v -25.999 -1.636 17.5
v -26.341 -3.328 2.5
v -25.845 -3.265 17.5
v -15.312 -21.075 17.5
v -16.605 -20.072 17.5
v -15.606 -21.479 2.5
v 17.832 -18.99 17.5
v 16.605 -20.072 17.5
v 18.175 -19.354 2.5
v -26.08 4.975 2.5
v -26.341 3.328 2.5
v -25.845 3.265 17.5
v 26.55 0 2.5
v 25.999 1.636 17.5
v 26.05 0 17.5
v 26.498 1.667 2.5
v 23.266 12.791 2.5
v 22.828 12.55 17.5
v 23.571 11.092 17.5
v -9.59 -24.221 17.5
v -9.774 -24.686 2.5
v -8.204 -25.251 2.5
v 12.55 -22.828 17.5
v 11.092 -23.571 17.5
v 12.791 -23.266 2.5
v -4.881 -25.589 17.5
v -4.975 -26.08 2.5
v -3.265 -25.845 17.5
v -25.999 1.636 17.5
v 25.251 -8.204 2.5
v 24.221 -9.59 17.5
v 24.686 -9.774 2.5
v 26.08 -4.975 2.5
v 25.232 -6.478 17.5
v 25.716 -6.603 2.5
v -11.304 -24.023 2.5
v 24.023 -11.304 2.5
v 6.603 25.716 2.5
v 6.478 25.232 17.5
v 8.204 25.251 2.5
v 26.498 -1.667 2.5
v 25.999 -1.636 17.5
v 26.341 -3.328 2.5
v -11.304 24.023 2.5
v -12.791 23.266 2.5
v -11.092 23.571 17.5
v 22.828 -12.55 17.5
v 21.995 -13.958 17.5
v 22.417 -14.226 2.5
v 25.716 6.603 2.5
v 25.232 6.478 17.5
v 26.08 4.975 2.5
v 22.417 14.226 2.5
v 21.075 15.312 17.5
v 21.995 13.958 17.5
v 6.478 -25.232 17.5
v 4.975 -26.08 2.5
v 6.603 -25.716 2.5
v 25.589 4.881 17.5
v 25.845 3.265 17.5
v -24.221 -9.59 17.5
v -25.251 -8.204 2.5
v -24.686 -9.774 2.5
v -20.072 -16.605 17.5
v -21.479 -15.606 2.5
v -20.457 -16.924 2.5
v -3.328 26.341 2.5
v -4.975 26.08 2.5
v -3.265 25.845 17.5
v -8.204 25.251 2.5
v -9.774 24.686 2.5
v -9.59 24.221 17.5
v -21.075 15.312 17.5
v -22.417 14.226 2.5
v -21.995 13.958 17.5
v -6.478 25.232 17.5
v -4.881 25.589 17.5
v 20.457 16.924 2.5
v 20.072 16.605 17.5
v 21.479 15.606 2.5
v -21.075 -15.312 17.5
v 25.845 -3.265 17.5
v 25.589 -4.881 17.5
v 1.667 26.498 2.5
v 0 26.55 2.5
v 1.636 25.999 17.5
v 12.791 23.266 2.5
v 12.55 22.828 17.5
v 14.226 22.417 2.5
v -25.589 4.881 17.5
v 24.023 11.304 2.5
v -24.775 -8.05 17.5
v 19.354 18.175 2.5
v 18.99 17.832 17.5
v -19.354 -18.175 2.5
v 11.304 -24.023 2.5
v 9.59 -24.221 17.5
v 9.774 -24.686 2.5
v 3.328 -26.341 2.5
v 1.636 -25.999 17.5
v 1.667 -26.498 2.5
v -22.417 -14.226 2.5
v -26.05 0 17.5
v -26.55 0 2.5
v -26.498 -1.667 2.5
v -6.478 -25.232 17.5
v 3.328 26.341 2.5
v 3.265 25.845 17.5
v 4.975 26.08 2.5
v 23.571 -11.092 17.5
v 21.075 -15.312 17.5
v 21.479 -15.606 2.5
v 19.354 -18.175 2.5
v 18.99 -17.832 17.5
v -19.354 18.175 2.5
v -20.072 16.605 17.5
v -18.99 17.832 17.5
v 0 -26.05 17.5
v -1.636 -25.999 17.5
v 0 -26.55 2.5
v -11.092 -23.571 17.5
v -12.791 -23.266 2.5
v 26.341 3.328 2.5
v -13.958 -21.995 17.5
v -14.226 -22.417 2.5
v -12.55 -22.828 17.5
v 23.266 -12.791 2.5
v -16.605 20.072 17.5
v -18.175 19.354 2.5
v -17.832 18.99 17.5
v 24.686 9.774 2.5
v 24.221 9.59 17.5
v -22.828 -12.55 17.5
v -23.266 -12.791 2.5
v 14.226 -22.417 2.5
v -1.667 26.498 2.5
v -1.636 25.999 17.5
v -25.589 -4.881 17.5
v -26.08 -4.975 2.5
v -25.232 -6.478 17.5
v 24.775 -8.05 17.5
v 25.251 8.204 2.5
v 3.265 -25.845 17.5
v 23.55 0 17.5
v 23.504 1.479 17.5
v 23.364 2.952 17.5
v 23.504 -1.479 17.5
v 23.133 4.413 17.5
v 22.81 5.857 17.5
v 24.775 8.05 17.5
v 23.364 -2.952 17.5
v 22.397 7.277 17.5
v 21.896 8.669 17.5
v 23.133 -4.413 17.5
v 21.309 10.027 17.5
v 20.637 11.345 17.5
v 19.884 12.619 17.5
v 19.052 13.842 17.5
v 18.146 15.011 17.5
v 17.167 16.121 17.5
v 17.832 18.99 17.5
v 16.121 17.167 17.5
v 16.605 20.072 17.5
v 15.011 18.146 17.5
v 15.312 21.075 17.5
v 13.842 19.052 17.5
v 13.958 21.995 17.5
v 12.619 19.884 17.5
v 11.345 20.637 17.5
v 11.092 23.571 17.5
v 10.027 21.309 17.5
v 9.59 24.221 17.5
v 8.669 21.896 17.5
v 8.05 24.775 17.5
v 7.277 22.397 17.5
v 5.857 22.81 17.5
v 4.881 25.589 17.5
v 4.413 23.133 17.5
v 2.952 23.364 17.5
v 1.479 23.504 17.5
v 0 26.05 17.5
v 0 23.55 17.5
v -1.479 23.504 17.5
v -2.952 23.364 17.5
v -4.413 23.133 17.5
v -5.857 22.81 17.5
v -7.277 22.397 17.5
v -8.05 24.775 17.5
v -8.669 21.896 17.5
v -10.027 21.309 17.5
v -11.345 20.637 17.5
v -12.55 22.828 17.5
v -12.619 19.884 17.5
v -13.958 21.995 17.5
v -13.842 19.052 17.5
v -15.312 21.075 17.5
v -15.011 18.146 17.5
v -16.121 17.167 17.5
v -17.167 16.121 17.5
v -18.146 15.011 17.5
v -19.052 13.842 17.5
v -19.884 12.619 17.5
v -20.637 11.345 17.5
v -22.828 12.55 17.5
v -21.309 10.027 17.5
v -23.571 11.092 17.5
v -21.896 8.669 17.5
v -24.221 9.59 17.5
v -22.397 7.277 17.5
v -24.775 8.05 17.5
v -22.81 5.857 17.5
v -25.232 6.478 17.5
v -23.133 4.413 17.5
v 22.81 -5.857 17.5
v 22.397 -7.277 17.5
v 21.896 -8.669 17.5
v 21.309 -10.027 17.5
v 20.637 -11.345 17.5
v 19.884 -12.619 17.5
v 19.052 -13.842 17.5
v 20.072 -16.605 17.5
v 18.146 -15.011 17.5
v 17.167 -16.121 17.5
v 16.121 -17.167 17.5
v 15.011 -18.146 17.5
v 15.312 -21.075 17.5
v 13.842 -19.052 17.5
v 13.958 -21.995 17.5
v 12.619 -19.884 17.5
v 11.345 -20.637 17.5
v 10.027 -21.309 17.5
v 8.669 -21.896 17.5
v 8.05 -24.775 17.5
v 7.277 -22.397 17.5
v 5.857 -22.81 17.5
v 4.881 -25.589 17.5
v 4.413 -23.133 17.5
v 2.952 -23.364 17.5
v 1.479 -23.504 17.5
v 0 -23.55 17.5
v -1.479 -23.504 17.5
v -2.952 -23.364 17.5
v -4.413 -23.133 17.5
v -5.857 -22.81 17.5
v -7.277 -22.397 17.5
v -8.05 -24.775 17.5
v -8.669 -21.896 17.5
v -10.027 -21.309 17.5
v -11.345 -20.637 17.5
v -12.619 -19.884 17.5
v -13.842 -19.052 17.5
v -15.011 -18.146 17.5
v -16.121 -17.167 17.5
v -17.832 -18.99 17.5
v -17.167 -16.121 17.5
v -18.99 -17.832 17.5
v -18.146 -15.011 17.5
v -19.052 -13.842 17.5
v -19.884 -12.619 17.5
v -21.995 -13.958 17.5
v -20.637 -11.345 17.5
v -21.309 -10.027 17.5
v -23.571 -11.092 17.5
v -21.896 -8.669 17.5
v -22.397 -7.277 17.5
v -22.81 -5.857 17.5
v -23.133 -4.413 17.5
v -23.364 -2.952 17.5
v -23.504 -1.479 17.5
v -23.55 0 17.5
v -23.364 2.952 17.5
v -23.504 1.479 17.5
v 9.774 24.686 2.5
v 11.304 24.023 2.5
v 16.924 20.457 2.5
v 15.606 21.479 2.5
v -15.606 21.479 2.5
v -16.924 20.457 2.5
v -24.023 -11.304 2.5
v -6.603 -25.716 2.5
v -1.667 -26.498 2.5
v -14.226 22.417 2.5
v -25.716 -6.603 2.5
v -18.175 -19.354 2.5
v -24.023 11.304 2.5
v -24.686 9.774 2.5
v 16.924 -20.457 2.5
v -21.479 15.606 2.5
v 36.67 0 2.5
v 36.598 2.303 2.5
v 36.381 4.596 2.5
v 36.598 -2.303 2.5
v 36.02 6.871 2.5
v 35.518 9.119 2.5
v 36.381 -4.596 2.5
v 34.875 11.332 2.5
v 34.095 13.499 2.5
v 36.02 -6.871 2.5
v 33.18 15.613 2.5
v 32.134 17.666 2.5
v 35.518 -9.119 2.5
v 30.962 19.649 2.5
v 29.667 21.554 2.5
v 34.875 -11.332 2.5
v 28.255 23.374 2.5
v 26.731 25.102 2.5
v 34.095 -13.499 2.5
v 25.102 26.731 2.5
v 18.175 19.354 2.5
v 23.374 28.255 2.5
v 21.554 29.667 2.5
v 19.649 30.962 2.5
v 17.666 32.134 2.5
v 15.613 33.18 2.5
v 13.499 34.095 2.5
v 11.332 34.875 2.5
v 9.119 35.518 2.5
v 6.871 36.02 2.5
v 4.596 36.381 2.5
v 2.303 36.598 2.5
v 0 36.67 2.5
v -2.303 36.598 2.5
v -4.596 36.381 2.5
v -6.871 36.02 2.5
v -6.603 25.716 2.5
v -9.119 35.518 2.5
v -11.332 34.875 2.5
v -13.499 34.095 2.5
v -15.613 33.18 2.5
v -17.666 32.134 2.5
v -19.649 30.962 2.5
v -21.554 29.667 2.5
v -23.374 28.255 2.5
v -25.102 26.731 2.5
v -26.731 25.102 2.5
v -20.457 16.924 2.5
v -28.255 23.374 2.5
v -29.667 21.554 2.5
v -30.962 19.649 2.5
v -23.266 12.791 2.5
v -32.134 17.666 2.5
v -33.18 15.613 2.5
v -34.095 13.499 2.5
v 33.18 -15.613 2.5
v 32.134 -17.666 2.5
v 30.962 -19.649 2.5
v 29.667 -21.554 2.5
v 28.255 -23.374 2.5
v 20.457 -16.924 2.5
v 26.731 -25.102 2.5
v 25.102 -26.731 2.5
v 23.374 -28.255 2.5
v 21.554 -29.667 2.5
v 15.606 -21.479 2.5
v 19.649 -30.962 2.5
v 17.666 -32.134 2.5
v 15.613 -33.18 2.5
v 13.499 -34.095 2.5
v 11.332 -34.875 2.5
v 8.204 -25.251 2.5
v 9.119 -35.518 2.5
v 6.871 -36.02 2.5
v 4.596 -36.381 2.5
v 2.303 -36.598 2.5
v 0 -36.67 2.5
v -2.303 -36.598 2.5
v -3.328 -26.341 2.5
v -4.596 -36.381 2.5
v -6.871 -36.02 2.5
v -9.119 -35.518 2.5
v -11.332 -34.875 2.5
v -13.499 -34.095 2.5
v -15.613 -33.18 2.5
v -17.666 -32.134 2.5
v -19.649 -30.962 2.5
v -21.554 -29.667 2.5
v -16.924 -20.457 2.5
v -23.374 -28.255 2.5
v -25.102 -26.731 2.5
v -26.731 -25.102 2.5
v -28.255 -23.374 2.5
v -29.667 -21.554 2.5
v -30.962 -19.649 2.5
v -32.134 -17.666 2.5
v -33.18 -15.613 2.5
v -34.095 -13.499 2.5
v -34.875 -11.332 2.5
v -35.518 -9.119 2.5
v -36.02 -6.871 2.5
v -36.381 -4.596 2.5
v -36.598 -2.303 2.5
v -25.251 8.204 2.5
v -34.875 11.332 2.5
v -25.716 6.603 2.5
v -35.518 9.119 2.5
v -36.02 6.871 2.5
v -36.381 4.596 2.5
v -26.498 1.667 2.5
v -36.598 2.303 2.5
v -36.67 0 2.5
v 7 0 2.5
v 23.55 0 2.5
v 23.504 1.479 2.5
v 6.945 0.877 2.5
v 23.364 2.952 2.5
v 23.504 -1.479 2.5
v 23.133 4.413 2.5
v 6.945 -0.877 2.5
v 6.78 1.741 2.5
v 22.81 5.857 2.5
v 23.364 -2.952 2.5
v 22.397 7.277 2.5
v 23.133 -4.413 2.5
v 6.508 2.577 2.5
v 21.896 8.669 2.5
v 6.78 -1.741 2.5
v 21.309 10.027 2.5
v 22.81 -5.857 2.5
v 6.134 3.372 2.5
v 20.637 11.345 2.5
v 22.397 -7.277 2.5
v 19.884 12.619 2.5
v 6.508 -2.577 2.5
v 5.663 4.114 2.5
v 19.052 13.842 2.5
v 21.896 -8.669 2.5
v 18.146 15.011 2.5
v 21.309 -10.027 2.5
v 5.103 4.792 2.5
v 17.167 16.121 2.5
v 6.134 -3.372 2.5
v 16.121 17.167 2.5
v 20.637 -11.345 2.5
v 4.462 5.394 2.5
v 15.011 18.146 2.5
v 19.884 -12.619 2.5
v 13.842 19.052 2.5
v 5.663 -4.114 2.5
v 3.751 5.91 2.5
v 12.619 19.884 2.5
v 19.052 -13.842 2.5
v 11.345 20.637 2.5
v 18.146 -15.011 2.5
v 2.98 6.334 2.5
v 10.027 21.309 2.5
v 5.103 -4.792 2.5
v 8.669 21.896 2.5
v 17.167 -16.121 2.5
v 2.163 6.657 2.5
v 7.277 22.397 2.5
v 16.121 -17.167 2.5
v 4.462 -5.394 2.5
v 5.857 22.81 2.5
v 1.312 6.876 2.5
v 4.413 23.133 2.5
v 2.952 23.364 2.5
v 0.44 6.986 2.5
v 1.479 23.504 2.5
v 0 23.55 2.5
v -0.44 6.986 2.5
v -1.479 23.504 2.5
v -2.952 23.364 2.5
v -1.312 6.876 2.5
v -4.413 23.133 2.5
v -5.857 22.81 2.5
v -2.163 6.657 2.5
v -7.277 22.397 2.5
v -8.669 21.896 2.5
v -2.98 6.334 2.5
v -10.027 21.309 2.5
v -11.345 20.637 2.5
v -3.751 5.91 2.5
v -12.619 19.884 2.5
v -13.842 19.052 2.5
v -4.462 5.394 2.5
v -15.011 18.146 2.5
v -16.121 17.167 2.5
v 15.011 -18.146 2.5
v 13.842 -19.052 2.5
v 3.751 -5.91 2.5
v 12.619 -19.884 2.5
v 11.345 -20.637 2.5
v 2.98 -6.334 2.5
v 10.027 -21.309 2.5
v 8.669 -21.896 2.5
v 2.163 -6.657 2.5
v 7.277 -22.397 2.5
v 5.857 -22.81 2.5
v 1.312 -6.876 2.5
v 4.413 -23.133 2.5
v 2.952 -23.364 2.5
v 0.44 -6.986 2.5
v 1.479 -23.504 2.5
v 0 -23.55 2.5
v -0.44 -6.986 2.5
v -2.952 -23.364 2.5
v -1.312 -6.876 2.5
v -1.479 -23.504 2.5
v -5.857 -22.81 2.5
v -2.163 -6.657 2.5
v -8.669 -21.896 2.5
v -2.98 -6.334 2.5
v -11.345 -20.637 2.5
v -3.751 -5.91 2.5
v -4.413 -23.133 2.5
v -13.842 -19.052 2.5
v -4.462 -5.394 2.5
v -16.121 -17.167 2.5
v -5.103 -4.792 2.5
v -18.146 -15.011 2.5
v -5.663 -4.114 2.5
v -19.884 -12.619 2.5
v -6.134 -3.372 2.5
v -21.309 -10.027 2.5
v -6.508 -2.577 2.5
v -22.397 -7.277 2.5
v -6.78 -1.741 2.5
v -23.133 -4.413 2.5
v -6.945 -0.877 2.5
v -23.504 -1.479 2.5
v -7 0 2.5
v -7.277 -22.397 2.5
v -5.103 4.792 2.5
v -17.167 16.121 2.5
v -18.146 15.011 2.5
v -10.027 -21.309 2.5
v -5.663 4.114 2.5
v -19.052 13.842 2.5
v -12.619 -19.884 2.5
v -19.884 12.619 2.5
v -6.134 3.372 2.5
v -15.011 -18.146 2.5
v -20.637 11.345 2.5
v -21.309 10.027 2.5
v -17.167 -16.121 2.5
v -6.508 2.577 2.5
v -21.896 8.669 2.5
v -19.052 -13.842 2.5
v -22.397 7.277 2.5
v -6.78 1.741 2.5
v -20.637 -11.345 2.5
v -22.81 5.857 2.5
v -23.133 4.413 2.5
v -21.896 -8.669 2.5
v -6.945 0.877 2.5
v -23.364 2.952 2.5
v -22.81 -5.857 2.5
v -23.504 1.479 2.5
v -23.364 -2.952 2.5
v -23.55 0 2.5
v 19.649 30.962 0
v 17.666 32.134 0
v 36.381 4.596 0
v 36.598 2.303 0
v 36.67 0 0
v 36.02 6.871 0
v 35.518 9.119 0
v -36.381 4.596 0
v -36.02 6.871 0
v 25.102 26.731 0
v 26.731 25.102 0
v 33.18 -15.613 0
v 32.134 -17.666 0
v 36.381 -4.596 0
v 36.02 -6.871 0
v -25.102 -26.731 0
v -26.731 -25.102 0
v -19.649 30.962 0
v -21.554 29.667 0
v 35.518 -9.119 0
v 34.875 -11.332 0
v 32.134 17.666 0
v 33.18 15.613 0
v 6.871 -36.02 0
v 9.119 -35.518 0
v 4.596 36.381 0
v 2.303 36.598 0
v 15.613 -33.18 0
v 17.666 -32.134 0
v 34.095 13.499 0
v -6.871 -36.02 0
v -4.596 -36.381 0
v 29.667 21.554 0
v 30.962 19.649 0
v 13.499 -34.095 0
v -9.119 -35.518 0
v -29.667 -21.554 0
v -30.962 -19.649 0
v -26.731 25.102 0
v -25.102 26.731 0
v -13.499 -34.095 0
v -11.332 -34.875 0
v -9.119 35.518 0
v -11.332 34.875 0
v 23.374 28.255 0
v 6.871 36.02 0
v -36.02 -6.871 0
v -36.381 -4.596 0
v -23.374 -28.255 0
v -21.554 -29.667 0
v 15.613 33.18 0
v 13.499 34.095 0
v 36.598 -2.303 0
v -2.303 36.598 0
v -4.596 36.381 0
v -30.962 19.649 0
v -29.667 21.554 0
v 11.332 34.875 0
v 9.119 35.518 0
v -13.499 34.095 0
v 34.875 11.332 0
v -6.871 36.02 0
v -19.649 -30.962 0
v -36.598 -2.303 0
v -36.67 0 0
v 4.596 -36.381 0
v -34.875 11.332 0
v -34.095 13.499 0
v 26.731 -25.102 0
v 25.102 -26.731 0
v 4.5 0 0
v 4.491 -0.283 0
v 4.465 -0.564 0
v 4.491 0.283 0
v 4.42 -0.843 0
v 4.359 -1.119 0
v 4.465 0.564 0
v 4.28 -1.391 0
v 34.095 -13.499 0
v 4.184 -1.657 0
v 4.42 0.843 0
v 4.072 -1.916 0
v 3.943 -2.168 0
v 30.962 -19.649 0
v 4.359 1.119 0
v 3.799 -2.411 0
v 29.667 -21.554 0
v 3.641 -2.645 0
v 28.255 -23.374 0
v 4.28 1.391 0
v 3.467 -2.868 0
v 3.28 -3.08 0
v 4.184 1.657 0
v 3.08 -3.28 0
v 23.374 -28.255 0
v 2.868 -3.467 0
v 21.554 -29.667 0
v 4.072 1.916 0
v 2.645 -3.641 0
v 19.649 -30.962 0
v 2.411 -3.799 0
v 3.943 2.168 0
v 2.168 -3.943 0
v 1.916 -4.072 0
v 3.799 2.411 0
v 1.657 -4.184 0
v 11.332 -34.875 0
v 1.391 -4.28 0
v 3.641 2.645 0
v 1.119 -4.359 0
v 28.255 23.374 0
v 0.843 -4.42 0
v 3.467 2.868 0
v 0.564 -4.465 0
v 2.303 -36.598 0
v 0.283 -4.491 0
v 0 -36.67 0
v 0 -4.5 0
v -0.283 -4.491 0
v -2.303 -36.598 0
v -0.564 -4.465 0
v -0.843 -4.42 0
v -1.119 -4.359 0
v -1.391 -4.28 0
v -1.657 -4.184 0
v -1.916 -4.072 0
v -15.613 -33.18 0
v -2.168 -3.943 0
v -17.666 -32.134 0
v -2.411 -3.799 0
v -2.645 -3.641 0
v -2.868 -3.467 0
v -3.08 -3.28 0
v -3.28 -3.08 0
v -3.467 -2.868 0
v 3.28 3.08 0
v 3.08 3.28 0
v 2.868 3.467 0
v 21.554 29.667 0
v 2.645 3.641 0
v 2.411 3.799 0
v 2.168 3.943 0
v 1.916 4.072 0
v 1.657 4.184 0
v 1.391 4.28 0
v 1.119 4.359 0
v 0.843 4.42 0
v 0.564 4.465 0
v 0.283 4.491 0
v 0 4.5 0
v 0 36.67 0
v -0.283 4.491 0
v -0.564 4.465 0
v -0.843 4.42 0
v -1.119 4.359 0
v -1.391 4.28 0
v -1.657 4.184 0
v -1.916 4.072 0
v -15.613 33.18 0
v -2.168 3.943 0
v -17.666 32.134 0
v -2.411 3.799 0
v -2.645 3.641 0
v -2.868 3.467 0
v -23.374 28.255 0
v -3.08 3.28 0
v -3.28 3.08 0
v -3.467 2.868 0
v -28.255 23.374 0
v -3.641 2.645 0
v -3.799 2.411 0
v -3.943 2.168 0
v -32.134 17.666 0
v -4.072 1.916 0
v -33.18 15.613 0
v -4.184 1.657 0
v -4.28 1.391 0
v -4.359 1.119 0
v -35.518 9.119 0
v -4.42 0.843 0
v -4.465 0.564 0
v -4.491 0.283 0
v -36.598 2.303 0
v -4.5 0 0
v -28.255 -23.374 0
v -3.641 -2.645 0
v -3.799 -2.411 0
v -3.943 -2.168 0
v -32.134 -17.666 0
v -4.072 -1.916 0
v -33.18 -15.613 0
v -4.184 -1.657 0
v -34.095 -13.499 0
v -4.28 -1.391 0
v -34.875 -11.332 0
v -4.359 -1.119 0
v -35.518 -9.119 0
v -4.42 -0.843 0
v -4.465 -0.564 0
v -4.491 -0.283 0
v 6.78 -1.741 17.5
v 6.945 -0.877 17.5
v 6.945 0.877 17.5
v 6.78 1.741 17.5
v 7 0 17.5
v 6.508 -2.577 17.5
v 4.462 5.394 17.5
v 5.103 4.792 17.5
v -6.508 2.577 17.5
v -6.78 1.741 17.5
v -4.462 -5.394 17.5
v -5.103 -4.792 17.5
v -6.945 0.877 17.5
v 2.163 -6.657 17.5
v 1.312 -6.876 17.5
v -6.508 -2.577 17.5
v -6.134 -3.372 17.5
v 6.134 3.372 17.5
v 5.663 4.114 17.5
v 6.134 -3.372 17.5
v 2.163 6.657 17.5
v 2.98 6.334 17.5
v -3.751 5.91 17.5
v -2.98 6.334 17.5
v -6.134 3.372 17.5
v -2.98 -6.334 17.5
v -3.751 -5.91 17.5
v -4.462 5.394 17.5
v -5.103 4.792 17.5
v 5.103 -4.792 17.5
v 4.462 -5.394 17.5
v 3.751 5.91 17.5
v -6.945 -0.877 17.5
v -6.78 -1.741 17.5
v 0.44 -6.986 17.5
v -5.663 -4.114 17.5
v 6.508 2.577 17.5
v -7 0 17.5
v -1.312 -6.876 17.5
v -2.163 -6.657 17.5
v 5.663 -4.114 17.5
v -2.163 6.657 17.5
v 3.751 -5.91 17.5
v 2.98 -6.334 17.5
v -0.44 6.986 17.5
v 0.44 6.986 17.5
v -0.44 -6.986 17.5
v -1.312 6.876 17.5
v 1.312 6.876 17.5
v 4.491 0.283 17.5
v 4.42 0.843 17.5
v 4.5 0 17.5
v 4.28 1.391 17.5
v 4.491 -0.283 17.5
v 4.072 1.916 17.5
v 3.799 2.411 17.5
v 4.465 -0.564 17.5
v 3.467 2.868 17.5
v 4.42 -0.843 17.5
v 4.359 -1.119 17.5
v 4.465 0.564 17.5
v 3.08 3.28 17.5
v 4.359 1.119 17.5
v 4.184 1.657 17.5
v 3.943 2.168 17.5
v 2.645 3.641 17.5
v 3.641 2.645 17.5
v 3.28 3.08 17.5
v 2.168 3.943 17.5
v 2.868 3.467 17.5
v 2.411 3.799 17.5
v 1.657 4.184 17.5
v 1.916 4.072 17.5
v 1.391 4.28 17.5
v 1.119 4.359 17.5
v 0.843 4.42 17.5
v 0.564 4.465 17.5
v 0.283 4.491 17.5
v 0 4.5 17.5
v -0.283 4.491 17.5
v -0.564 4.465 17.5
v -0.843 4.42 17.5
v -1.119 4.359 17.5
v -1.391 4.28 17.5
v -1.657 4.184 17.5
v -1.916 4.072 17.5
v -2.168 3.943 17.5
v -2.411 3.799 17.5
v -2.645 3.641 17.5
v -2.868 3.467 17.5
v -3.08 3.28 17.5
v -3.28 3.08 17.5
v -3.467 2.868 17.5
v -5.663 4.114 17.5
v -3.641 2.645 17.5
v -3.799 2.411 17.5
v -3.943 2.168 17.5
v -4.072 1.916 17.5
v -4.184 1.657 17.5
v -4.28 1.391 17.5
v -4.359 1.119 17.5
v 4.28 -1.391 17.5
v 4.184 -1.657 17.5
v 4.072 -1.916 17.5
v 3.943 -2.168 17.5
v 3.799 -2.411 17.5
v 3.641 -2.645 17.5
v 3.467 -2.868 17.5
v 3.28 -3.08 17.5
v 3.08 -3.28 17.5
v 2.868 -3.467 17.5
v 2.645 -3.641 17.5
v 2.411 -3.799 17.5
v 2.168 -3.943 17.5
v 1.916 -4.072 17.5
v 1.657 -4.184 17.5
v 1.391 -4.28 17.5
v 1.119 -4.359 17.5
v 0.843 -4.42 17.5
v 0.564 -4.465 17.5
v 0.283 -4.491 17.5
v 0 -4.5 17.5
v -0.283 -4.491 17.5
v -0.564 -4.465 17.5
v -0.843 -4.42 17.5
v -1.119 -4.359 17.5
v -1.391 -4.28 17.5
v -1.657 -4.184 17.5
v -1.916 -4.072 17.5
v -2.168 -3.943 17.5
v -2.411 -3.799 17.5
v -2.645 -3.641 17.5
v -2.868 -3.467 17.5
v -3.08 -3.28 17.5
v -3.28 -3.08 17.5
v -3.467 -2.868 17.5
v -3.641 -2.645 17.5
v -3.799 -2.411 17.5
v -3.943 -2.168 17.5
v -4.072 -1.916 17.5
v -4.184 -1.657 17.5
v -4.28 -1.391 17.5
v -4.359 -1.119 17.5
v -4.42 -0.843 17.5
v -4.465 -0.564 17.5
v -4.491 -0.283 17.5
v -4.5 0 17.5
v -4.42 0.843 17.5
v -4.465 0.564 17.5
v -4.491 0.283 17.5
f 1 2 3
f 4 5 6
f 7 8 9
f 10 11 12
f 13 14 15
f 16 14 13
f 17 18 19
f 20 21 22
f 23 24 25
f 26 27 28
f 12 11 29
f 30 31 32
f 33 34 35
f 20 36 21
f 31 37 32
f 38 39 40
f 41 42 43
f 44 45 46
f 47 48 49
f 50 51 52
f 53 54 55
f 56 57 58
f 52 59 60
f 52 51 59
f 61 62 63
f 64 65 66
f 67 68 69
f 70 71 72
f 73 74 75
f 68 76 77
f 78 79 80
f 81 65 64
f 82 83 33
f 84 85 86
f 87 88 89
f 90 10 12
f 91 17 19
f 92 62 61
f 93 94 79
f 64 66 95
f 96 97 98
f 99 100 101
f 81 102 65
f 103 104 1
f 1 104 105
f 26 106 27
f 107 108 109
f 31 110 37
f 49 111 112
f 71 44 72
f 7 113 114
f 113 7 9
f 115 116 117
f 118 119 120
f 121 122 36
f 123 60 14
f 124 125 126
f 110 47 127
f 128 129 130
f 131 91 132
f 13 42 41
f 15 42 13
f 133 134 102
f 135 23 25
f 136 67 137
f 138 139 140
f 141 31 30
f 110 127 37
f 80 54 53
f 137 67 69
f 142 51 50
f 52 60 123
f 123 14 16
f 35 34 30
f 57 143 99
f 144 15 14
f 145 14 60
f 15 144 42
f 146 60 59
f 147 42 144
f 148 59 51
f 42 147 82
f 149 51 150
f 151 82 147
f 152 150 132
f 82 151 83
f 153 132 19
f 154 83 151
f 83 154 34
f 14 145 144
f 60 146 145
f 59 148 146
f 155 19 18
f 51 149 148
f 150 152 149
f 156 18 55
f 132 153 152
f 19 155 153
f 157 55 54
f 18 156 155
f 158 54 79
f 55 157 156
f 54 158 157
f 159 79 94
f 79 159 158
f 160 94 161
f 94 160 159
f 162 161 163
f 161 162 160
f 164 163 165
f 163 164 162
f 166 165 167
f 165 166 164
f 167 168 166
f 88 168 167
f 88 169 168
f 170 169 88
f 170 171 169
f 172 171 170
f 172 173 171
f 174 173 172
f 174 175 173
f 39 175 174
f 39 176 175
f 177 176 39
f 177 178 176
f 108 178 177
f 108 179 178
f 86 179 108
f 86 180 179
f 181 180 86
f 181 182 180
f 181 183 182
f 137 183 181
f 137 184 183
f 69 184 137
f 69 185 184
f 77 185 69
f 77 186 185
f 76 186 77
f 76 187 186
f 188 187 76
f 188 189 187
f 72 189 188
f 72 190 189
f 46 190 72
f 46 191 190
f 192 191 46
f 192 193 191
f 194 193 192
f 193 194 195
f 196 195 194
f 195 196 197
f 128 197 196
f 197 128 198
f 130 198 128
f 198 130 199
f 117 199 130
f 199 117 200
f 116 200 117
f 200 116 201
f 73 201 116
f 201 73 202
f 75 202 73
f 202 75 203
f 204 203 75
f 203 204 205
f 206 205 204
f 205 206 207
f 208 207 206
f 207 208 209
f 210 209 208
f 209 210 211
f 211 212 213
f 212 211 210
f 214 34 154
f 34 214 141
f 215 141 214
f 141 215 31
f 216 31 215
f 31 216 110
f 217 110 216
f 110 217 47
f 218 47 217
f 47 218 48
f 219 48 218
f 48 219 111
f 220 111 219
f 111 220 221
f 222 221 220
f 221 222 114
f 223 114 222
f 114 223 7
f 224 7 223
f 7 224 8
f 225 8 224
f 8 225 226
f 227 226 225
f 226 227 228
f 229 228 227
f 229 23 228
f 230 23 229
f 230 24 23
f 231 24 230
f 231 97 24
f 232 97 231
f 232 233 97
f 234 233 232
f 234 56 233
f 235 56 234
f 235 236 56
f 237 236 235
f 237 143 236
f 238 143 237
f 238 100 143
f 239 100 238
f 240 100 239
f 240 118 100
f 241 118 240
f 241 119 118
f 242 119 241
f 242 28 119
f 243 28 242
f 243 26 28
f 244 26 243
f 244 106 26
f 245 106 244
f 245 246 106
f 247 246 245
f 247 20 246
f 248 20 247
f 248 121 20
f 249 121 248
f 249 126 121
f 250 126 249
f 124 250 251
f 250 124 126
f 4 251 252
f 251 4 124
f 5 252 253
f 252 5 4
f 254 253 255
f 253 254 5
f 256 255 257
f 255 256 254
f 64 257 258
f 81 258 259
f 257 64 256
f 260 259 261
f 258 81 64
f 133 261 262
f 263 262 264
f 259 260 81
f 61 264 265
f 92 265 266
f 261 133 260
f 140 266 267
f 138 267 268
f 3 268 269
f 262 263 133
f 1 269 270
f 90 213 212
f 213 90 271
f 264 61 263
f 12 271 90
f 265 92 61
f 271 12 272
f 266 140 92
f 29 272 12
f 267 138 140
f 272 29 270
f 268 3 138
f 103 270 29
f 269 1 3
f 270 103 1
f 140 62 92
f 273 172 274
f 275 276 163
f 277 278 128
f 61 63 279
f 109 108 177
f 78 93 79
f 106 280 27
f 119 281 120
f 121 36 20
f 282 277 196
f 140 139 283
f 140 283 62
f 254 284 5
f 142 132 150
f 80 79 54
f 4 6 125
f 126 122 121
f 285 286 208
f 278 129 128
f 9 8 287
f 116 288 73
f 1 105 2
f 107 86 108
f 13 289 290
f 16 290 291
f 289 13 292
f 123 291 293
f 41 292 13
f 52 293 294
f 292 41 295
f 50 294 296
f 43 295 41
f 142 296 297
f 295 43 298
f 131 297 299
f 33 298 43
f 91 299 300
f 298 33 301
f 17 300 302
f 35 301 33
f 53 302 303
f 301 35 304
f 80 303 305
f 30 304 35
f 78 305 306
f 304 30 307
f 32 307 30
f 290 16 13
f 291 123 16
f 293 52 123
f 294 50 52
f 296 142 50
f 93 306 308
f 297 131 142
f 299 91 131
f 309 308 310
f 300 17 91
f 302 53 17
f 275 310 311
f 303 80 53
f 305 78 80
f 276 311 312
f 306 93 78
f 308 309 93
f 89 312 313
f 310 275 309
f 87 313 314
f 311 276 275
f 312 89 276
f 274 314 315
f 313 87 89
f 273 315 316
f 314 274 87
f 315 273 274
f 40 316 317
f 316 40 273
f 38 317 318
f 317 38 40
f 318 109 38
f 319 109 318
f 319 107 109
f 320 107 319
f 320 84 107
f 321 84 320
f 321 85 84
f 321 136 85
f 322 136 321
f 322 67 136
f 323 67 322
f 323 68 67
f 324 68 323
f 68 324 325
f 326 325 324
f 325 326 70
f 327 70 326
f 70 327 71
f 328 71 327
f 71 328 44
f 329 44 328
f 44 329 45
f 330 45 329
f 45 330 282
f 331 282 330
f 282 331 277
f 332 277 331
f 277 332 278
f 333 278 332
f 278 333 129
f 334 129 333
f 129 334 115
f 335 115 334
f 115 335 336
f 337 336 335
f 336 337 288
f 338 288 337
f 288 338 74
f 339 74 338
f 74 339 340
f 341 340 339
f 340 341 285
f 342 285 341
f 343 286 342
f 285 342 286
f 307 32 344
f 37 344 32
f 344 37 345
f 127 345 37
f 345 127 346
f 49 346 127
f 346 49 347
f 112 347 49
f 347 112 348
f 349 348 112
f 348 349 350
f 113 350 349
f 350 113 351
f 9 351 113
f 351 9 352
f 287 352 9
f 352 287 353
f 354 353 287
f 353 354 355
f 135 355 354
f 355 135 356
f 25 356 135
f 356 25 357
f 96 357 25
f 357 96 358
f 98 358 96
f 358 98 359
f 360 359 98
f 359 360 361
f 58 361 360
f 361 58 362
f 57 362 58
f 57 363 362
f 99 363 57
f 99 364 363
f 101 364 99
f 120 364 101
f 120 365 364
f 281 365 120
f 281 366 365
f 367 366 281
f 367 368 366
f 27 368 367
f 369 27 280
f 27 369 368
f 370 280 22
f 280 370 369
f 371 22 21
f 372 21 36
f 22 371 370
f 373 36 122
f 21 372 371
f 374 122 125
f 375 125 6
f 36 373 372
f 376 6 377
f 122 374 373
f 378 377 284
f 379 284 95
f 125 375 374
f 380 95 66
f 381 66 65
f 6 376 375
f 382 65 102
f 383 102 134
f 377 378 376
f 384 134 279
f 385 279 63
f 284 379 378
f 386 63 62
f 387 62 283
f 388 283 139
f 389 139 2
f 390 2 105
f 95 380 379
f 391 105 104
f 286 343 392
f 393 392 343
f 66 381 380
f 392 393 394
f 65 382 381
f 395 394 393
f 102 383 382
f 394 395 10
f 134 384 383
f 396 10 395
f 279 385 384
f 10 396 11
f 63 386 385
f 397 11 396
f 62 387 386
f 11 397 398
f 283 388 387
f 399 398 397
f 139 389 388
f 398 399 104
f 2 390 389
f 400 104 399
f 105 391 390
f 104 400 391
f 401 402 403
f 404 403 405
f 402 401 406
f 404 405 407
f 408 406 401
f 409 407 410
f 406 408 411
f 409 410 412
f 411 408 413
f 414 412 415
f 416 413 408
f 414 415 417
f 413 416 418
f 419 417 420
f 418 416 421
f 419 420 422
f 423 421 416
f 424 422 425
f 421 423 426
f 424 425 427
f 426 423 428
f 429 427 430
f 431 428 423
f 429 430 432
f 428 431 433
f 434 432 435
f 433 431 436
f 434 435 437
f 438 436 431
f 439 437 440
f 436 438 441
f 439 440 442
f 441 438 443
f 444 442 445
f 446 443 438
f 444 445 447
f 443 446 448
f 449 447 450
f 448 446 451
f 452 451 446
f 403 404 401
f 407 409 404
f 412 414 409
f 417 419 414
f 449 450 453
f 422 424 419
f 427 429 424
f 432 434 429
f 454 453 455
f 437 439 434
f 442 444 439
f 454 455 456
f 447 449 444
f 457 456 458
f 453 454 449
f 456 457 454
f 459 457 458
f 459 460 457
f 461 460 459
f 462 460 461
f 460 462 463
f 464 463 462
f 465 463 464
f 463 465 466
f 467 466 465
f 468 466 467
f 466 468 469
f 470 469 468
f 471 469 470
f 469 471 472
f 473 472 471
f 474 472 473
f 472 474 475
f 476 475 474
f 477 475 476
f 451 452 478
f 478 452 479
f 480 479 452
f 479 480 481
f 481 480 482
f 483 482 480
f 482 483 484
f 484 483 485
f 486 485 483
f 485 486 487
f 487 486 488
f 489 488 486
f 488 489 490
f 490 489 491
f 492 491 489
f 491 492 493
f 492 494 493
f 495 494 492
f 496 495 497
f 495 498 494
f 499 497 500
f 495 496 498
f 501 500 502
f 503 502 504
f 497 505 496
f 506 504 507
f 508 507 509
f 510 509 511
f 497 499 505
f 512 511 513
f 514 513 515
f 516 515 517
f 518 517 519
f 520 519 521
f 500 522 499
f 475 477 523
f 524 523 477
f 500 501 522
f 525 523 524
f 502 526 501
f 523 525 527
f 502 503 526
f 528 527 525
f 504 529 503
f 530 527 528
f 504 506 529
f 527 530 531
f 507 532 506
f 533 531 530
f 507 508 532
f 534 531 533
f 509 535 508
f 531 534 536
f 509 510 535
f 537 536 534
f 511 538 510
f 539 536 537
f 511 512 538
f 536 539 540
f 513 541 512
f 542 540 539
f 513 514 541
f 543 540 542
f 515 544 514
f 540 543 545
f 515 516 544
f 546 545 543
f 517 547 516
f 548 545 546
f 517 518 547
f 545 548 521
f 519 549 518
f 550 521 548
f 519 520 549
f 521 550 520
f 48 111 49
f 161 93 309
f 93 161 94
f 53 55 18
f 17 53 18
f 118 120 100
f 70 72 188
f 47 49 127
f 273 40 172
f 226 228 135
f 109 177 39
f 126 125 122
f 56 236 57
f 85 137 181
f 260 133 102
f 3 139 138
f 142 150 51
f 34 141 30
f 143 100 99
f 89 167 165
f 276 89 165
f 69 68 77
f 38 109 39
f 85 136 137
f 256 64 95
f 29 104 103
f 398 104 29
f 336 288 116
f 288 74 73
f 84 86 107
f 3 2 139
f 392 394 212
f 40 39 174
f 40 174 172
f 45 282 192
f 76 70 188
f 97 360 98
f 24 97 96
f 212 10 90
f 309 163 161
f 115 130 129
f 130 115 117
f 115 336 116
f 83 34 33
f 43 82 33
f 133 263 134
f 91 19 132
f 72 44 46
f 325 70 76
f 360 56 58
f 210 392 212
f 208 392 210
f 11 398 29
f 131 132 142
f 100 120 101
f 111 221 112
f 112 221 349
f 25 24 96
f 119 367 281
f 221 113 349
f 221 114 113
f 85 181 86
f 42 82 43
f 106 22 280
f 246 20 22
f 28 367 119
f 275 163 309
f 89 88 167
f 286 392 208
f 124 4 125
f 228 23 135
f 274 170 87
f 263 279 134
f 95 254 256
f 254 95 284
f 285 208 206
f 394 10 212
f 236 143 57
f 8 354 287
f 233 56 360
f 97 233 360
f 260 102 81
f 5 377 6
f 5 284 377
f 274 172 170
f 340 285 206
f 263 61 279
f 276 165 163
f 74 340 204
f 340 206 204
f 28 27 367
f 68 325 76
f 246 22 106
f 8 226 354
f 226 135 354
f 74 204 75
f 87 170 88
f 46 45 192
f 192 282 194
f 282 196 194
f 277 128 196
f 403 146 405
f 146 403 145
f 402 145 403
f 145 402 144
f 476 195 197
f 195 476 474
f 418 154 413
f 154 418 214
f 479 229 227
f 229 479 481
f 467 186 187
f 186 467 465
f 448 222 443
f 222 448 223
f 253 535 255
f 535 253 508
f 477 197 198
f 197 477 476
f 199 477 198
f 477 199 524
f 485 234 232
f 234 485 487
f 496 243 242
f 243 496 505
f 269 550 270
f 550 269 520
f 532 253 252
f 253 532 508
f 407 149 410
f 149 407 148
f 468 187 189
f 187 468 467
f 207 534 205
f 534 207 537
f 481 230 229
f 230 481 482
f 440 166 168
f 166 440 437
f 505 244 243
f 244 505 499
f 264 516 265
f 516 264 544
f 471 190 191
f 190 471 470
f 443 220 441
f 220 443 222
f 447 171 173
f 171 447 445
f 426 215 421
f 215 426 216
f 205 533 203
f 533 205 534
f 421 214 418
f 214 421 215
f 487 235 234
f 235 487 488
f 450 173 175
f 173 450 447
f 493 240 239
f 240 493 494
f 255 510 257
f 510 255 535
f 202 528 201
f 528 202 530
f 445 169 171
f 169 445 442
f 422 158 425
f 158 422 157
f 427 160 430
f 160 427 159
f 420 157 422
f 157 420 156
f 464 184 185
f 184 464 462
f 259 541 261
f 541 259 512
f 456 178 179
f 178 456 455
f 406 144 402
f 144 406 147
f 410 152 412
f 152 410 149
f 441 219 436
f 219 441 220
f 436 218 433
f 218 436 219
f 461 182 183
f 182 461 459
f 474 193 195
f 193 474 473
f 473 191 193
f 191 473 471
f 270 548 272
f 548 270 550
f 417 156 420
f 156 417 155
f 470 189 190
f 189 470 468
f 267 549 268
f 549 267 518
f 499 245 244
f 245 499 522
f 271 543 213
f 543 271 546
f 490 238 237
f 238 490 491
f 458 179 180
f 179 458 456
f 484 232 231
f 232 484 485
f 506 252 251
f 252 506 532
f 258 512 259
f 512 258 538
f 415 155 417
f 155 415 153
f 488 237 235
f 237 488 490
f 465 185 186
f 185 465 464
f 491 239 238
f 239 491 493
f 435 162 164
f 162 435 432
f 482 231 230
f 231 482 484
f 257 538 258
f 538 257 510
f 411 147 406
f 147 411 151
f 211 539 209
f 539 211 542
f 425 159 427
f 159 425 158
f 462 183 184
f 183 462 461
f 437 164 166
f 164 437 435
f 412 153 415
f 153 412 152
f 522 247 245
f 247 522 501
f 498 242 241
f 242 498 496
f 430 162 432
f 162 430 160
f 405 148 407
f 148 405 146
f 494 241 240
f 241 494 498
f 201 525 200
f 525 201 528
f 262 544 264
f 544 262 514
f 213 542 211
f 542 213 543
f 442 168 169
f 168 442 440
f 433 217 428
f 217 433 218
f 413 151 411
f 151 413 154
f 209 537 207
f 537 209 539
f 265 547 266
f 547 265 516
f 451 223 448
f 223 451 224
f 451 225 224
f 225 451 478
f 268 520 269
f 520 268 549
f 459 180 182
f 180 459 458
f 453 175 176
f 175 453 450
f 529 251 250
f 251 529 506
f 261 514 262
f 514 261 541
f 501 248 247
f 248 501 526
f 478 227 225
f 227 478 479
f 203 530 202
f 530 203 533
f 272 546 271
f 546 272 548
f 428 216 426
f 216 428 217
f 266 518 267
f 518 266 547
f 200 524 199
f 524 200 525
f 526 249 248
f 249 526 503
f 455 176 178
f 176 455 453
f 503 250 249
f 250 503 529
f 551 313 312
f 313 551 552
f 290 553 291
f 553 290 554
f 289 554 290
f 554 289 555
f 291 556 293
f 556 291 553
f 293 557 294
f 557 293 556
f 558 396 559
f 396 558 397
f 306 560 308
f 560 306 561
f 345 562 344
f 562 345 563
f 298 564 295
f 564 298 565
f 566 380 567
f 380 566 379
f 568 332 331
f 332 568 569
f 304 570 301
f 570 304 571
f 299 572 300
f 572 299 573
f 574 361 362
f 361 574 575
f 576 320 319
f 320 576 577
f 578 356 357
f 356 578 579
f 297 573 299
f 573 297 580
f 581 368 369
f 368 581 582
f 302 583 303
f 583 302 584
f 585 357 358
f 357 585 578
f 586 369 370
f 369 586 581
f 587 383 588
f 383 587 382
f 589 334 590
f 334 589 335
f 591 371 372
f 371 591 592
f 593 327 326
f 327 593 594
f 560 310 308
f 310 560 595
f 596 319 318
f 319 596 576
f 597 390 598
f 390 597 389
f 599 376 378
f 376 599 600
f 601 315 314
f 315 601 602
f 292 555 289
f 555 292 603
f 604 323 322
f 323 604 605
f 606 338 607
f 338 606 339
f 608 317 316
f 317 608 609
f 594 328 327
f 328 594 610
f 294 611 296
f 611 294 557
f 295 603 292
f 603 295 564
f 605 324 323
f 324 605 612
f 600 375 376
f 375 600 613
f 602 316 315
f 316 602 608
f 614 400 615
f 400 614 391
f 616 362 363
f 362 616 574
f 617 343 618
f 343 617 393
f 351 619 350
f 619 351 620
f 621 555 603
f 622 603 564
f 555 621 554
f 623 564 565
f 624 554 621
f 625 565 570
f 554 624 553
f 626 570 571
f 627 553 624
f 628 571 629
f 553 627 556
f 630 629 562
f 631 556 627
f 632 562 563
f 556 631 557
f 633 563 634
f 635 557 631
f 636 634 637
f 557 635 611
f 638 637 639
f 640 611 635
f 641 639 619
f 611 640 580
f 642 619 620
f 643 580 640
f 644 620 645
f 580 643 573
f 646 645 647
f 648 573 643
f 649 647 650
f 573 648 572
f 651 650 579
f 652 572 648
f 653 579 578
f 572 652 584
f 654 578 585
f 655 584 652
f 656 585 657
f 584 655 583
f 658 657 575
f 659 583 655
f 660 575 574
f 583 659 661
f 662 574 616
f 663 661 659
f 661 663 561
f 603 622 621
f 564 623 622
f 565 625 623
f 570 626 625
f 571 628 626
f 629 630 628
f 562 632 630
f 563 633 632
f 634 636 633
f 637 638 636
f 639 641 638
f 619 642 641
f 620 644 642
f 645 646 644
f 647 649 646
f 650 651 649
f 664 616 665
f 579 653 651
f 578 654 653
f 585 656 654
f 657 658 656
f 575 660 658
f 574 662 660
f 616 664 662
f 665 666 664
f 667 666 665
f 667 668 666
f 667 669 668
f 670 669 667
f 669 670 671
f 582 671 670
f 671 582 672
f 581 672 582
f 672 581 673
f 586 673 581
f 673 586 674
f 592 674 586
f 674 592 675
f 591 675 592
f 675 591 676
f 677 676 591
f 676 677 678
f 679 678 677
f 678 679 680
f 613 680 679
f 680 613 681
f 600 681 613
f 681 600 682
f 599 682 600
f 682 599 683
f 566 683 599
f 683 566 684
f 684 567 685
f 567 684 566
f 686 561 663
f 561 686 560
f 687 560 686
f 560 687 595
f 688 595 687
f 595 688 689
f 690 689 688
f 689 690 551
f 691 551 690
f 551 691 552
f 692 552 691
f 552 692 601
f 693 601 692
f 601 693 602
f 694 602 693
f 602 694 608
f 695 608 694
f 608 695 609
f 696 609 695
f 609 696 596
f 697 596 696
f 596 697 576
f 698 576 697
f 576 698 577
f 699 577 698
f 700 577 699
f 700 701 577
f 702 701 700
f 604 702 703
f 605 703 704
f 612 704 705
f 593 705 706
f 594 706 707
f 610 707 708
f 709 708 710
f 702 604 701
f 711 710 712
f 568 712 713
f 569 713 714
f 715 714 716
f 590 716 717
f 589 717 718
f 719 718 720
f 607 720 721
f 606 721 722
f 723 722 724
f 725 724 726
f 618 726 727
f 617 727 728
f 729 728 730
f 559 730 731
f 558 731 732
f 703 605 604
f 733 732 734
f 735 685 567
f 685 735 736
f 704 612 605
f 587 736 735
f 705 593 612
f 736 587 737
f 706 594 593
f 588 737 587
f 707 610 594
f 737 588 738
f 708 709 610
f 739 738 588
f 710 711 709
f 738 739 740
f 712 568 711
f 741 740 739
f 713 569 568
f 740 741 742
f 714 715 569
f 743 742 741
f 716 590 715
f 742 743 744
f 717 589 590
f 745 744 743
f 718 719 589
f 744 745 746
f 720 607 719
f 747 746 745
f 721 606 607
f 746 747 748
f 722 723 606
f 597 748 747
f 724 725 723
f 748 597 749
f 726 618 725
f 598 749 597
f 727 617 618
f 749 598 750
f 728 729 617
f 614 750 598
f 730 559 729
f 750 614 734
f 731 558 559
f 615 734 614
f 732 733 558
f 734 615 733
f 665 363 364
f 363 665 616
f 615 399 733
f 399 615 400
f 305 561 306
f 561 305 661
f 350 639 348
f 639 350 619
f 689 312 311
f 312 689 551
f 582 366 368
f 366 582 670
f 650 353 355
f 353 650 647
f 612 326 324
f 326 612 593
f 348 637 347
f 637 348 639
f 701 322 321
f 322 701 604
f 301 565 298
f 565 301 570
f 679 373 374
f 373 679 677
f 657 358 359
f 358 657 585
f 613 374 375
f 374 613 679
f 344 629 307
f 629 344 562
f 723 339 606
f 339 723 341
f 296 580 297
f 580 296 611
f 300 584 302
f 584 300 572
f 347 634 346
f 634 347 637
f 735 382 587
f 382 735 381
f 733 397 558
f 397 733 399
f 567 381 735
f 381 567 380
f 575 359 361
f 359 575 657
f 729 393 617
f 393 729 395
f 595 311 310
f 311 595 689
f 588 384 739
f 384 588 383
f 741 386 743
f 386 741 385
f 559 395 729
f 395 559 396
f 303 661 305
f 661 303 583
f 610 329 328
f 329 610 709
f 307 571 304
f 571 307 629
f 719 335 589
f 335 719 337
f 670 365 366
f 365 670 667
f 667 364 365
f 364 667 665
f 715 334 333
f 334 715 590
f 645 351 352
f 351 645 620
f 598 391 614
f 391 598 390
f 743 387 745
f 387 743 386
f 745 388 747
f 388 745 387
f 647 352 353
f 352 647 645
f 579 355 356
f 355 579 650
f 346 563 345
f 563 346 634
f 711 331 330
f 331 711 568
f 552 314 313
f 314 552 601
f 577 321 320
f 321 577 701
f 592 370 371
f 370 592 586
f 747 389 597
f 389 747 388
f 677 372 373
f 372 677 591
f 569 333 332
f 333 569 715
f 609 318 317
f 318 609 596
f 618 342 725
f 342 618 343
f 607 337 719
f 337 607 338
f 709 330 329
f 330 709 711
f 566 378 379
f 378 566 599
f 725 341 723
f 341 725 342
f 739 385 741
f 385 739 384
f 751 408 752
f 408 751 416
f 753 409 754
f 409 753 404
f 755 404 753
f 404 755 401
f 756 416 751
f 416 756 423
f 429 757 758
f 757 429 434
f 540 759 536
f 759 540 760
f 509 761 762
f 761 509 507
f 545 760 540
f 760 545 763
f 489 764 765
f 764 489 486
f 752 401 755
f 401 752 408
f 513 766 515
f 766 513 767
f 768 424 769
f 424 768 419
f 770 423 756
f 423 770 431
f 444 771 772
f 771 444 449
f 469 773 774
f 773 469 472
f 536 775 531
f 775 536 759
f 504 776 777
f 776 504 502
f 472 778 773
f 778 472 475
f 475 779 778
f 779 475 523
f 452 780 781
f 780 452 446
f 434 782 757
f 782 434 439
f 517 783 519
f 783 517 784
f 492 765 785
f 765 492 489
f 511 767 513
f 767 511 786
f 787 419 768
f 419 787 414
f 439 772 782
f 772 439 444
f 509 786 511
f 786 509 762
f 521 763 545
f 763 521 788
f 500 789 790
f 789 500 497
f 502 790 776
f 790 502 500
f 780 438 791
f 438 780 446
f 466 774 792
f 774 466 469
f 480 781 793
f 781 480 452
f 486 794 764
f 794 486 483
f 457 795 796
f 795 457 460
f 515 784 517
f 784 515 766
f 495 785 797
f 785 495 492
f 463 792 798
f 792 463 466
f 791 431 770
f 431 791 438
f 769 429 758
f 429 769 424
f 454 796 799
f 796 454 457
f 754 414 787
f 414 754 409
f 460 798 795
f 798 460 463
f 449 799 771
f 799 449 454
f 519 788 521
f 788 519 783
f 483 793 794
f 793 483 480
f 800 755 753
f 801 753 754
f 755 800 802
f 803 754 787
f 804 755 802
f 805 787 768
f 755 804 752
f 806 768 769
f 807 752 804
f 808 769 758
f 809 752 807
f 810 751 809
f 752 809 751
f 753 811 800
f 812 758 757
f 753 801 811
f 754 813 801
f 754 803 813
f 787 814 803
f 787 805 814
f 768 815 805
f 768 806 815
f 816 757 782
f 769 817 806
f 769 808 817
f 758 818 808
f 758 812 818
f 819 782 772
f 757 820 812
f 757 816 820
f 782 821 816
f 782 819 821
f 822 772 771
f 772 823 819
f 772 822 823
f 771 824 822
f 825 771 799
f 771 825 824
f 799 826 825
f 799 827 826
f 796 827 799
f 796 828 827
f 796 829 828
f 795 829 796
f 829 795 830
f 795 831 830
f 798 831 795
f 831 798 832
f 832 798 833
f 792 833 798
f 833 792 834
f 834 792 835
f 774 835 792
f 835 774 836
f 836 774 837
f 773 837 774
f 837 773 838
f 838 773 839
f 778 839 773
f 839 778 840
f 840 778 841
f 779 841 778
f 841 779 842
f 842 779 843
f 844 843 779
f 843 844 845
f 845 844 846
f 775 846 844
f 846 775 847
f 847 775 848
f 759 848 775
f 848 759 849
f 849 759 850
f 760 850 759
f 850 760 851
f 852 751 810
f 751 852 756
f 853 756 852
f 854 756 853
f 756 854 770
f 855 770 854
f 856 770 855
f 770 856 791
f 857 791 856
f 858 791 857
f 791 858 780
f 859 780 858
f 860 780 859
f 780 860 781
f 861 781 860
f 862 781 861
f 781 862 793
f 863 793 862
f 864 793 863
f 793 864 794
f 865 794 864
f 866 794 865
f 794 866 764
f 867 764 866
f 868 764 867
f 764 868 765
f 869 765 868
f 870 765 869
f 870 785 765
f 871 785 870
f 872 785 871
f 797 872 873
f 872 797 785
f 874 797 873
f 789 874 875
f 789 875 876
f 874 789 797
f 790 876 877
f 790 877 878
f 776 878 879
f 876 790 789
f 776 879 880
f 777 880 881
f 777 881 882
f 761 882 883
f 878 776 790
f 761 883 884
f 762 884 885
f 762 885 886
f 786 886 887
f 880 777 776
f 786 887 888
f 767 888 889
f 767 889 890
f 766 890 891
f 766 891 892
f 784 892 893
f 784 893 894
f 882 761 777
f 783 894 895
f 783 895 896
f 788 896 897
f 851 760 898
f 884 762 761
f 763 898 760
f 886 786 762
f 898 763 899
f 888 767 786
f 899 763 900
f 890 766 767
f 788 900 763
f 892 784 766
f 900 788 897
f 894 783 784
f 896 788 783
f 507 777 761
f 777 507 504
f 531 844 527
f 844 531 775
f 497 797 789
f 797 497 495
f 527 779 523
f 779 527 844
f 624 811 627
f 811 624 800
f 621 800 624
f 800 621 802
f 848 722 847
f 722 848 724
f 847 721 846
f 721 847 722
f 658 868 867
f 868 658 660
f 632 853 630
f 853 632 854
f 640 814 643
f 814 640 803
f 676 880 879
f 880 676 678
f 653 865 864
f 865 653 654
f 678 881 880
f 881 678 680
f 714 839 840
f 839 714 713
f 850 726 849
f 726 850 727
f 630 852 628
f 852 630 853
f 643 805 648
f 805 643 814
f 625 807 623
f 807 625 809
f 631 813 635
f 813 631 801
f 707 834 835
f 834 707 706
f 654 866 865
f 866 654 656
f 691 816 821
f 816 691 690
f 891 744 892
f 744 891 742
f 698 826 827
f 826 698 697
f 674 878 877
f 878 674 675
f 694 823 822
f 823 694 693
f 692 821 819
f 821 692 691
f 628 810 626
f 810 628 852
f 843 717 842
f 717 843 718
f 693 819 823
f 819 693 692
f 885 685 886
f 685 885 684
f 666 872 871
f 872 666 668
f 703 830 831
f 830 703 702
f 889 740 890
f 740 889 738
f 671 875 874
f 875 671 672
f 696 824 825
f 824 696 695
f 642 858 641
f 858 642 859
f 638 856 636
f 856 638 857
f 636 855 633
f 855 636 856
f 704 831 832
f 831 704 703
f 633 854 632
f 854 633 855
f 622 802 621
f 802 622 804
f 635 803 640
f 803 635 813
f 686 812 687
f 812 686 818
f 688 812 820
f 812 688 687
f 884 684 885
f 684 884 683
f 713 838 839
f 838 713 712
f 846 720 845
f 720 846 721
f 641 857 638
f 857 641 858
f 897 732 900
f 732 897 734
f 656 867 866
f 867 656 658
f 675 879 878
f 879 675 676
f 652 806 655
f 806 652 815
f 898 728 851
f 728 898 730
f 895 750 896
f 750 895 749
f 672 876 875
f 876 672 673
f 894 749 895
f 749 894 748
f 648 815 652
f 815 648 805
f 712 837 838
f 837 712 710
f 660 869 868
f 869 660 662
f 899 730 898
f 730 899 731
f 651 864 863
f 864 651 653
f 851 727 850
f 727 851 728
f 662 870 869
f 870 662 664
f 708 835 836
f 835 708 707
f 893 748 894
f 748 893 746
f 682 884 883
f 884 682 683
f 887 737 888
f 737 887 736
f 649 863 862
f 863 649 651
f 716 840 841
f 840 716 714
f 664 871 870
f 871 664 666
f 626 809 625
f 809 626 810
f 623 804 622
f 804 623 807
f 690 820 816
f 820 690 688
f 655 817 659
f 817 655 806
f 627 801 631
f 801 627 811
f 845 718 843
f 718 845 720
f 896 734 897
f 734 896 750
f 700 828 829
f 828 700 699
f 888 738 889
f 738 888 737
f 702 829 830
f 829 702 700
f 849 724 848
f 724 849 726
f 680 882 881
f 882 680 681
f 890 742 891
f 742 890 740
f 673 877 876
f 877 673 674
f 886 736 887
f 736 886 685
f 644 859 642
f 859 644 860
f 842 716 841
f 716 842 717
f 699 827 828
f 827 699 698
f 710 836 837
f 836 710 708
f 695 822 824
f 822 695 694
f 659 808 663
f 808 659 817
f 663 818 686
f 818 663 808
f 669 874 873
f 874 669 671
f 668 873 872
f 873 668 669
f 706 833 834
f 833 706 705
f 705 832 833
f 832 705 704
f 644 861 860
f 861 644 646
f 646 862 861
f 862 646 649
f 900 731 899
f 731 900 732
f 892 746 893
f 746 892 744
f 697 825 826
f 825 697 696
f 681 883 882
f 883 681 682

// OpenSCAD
// https://www.thingiverse.com/thing:2611177
// Redesign by Josh Miller
// 30-Jan-18

// Adjust the following parameters:
//set this to equal your spool's hole size + 0.5mm for a tight fit
spool_hole=53.1;
//Set tapper so so the spool hole minus taper diameter is about 0.5mm to 1mm smaller than spool
taper_diameter=1.0;
taper_radious=taper_diameter/2;
rod_hole=8;//set this to the size of the rod that you are using as an axis for the spool Note: 1mm added for loose fit
rod_hole_support="yes";//[no,yes]
//height of the inner cylinder
retainer_height=15;
retainer_thickness=2.5;
resolution=100;//resolution of the model
lip_height=2.5;//thickness of the outer lip
// If you wish for any more customizable parameters, ask on the coments here: http://www.thingiverse.com/thing:2611177/#comments
////////Don't edit the following unless you know what you're doing/////////
module bushing(){//this is our bushing 
	difference(){
		union(){
            translate([0,0,lip_height]){//shift retainer up by thickness of lip height
                difference(){
                   cylinder(r1=spool_hole/2,r2=spool_hole/2-taper_radious,h=retainer_height,$fn=resolution);
                    //shift hole to get better preview
                    translate([0,0,-1])
				   cylinder(r=spool_hole/2-taper_radious-retainer_thickness,h=retainer_height+2,$fn=resolution);}}//inner subtraction
			cylinder(r=spool_hole/2+spool_hole/5-0.5,h=lip_height,$fn=resolution);//outer plate
            if (rod_hole_support=="yes") cylinder(r=rod_hole/2+retainer_thickness+0.5,h=lip_height+retainer_height,$fn=resolution*1/2);//
		}
        //shift hole to get better preview
		translate([0,0,-1])
        cylinder(r=rod_hole/2+0.5,h=lip_height+retainer_height+2,$fn=resolution);//spool rod hole
	}
}
bushing();//calling the first bushing 
